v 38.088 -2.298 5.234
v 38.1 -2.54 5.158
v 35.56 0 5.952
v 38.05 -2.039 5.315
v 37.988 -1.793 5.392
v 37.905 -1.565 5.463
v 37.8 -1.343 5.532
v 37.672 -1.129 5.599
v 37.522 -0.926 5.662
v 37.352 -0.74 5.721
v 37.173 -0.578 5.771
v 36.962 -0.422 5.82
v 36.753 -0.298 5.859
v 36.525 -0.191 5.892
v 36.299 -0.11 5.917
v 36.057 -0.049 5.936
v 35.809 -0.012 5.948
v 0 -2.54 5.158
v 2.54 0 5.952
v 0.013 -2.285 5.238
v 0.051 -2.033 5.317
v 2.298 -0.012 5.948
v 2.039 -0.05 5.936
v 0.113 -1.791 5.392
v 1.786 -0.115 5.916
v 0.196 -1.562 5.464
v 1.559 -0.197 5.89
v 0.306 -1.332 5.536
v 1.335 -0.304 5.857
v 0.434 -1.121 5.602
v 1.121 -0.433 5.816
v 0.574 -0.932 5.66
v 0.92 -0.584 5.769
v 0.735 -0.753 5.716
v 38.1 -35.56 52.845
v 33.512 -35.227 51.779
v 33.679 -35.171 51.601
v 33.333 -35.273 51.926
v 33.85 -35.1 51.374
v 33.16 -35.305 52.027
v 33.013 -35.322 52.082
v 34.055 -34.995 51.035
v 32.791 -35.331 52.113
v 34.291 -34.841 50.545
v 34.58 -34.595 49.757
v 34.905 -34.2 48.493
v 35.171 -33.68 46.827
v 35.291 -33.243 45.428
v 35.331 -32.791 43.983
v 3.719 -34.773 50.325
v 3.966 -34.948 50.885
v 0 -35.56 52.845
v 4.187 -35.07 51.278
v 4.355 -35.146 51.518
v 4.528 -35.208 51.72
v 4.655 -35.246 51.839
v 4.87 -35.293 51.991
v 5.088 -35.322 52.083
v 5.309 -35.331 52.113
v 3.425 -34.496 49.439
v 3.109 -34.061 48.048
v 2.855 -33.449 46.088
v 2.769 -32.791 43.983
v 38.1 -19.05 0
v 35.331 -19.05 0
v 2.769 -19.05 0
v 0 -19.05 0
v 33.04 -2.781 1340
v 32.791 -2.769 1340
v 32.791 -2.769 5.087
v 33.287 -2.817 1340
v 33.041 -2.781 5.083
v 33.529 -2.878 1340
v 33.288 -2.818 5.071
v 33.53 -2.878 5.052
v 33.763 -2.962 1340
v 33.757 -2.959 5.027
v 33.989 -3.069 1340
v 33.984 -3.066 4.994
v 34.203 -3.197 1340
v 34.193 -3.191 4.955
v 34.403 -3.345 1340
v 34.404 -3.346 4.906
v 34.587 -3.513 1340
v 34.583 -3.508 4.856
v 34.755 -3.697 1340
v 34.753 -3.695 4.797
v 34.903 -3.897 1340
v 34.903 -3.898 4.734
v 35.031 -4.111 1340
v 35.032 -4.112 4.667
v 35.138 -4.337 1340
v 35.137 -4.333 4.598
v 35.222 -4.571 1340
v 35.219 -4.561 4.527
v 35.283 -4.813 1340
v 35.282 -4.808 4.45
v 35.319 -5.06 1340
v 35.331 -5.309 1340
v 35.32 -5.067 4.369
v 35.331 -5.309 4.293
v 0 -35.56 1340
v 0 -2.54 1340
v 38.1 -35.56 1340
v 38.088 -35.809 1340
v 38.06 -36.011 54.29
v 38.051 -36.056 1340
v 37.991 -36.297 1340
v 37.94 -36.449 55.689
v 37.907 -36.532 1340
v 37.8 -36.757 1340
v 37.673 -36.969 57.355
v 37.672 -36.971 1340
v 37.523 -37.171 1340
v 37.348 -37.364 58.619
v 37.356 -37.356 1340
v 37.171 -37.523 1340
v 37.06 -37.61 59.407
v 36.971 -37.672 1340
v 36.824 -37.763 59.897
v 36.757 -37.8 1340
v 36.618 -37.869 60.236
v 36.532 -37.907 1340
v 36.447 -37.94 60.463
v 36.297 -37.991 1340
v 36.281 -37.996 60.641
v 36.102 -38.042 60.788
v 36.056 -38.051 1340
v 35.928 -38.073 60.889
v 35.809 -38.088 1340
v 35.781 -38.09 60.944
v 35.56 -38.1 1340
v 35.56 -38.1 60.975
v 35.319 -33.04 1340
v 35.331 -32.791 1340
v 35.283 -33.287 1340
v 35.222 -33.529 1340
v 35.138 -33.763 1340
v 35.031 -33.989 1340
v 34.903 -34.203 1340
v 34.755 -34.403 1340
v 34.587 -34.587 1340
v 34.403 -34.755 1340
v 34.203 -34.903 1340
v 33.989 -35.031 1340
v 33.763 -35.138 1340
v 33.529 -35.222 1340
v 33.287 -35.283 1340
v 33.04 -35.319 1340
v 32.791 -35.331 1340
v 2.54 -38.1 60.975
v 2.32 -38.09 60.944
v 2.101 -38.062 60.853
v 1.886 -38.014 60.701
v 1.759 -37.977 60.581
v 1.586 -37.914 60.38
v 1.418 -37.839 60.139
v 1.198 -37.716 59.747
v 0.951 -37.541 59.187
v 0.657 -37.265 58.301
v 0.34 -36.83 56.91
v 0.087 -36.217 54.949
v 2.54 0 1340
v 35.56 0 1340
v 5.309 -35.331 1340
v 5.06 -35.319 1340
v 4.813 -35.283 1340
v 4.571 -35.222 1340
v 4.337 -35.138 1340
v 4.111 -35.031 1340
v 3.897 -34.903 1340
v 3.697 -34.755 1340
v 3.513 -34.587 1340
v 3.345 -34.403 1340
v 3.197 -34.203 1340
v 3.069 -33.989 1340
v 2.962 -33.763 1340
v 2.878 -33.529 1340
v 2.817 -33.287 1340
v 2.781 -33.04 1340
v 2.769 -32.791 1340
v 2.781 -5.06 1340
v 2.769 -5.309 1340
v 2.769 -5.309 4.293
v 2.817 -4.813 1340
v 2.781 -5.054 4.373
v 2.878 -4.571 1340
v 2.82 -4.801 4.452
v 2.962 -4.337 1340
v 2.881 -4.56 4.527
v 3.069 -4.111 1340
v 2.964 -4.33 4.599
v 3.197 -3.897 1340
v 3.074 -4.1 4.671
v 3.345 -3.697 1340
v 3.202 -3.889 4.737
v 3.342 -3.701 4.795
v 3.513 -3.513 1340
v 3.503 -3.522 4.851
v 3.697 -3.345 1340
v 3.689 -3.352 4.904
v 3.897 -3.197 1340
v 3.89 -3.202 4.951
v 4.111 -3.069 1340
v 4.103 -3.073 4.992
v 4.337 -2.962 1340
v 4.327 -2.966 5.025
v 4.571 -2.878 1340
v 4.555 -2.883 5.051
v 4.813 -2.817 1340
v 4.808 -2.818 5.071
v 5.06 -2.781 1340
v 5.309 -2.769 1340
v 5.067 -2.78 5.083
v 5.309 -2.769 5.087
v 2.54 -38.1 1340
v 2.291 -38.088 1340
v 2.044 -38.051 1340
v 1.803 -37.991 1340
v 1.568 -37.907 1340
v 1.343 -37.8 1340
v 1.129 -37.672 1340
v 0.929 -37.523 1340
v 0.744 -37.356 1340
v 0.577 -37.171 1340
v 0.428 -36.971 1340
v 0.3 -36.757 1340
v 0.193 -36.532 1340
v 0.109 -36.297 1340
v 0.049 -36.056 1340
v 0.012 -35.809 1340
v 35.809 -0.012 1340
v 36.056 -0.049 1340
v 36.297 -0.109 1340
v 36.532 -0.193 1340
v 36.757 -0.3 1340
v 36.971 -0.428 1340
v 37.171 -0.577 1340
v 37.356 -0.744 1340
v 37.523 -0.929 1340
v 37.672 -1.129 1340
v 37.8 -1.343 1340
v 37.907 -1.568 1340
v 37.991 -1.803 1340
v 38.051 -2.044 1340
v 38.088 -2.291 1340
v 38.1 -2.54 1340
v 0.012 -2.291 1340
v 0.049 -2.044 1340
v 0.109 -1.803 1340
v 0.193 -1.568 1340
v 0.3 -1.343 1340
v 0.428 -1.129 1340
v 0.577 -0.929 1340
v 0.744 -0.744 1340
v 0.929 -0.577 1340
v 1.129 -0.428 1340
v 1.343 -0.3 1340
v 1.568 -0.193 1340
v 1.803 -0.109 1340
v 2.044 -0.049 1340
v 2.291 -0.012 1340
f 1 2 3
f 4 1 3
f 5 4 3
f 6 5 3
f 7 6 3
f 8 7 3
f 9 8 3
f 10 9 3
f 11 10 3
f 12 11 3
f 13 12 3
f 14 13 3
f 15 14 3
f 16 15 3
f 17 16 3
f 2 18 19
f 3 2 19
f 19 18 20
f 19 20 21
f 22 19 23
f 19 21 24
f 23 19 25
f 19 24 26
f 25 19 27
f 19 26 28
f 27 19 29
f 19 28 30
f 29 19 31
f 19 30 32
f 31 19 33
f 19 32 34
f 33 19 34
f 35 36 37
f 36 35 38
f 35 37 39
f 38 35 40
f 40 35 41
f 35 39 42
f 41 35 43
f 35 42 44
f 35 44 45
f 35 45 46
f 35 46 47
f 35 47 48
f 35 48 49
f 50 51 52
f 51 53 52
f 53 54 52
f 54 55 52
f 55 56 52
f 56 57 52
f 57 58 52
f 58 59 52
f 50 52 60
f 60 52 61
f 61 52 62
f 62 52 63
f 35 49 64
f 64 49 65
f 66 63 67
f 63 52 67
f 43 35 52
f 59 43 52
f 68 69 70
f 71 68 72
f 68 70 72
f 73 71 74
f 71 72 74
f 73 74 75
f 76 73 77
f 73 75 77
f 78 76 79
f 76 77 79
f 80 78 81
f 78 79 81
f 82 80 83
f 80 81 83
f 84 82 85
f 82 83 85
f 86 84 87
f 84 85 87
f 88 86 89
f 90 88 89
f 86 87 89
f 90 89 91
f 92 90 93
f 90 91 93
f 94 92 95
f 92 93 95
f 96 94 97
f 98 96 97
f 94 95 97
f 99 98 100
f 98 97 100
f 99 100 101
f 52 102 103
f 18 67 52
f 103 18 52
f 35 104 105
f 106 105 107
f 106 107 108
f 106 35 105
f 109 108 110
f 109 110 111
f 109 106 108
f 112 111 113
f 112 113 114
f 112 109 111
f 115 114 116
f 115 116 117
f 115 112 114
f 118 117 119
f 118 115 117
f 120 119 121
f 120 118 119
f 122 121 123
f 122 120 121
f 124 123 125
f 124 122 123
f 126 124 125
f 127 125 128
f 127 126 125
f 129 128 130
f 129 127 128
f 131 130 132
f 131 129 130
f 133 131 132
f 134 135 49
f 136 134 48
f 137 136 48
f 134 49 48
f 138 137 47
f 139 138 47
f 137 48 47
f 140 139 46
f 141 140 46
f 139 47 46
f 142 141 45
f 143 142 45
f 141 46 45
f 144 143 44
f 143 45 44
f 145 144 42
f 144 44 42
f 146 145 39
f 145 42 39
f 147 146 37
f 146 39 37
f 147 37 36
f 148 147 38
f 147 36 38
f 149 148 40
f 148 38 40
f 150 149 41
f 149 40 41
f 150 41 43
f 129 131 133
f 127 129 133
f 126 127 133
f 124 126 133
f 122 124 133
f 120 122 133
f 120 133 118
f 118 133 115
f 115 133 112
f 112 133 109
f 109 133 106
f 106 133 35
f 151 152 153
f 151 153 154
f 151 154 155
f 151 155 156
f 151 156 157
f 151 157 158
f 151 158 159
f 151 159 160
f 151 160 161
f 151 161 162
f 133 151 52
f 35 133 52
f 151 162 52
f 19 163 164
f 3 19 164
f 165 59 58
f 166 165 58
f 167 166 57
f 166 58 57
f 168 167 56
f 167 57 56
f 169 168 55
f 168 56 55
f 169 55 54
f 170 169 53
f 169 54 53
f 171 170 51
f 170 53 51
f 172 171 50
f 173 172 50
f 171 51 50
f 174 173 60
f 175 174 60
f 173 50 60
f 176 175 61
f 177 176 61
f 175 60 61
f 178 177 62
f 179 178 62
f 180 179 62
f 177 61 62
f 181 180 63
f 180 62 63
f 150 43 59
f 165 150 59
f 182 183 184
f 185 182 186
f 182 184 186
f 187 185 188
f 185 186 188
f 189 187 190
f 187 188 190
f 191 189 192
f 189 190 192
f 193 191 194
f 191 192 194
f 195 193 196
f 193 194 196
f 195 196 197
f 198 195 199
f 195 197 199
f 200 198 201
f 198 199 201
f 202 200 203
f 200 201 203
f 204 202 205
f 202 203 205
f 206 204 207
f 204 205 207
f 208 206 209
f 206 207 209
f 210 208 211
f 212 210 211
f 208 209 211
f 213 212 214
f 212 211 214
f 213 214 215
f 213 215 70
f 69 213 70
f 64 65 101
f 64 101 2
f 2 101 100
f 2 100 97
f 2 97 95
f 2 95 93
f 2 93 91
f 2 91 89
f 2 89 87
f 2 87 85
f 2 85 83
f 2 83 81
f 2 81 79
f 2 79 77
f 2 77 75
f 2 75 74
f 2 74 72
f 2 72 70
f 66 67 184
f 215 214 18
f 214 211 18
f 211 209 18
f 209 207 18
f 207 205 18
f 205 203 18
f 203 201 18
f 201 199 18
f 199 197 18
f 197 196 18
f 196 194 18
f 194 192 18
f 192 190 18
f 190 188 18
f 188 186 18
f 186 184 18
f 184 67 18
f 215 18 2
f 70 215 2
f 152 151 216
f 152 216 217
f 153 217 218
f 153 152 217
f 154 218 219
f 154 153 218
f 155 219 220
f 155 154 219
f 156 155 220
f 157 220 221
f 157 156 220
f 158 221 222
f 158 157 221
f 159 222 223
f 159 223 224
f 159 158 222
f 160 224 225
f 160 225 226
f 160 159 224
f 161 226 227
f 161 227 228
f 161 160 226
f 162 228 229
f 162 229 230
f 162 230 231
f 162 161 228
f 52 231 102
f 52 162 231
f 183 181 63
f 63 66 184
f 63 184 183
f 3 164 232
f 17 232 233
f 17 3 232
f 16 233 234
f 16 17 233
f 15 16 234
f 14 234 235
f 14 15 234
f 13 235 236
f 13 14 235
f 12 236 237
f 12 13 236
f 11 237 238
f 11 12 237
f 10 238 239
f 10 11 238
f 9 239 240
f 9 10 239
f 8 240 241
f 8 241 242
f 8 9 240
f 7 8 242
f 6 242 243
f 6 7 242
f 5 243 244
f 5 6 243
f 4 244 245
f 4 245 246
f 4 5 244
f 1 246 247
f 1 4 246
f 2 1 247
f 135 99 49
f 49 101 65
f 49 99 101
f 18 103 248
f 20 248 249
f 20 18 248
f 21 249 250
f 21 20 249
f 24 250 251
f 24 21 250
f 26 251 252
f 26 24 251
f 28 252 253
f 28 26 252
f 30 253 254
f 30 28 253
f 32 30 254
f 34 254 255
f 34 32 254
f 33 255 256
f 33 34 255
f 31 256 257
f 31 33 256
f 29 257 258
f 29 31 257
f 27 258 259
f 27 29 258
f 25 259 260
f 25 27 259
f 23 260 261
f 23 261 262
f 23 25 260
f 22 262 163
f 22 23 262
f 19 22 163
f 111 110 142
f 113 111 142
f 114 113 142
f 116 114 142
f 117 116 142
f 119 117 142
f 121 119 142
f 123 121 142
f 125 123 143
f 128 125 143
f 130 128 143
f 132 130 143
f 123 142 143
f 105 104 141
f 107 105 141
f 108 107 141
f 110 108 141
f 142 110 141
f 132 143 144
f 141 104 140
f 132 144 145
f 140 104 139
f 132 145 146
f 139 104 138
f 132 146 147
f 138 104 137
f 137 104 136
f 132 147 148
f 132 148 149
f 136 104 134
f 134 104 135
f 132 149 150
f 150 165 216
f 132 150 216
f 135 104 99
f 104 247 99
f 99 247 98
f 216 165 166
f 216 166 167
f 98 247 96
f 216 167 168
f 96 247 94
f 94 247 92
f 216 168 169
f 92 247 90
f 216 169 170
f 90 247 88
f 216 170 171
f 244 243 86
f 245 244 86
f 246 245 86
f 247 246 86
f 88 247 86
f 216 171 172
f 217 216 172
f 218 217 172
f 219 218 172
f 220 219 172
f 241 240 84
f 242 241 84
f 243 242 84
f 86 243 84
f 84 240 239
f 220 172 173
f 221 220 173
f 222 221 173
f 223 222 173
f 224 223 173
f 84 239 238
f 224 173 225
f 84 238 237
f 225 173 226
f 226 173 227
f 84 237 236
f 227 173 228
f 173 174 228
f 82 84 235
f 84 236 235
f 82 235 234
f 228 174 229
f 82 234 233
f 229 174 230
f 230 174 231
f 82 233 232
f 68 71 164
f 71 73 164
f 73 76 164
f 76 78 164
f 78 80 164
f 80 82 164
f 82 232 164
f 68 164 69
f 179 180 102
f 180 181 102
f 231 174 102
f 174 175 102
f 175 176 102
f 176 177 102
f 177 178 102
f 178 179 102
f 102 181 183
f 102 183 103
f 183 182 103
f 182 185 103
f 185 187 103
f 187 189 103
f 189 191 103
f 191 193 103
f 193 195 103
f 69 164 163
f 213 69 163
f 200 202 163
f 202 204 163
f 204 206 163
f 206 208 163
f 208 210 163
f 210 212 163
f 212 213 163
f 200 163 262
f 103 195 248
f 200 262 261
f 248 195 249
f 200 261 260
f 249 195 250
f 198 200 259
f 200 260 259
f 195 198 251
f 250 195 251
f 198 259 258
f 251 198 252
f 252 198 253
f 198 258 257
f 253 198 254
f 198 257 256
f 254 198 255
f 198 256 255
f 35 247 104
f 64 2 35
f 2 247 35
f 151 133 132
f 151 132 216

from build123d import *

# Parameters (mm, degrees)
BOSS_EXTRUDE1_DEPTH = 1340
CUT_EXTRUDE1_DEPTH  = 1342.082853518


with BuildPart() as part:
    # Sketch1 → Boss-Extrude1 (new body)
    with BuildSketch(Plane.XY):
        with BuildLine():
            Line((2.54, 0), (35.56, 0))
            ThreePointArc((35.56, 0), (37.356051224, -0.743948776), (38.1, -2.54))
            Line((38.1, -2.54), (38.1, -35.56))
            ThreePointArc((38.1, -35.56), (37.356051224, -37.356051224), (35.56, -38.1))
            Line((35.56, -38.1), (2.54, -38.1))
            ThreePointArc((2.54, -38.1), (0.743948776, -37.356051224), (0, -35.56))
            Line((0, -35.56), (0, -2.54))
            ThreePointArc((0, -2.54), (0.743948776, -0.743948776), (2.54, 0))
        make_face()
        with BuildLine():
            Line((5.3086, -2.7686), (32.7914, -2.7686))
            ThreePointArc((32.7914, -2.7686), (34.587451224, -3.512548776), (35.3314, -5.3086))
            Line((35.3314, -5.3086), (35.3314, -32.7914))
            ThreePointArc((35.3314, -32.7914), (34.587451224, -34.587451224), (32.7914, -35.3314))
            Line((32.7914, -35.3314), (5.3086, -35.3314))
            ThreePointArc((5.3086, -35.3314), (3.512548776, -34.587451224), (2.7686, -32.7914))
            Line((2.7686, -32.7914), (2.7686, -5.3086))
            ThreePointArc((2.7686, -5.3086), (3.512548776, -3.512548776), (5.3086, -2.7686))
        make_face(mode=Mode.SUBTRACT)
    extrude(amount=BOSS_EXTRUDE1_DEPTH)

    # Sketch2 → Cut-Extrude1 (cut, through all)
    with BuildSketch(Plane.ZY):
        Polygon((0, -2.54), (5.15810206, -2.54), (5.951656223, 0), (0, 0), align=None)
        Polygon((0, -2.54), (0, -19.05), (5.15810206, -2.54), align=None)
        Polygon((52.845038121, -35.56), (0, -19.05), (0, -35.56), align=None)
        Polygon((60.975043986, -38.1), (52.845038121, -35.56), (0, -35.56), (0, -38.1), align=None)
    extrude(amount=-CUT_EXTRUDE1_DEPTH, mode=Mode.SUBTRACT)


solid = part.part
